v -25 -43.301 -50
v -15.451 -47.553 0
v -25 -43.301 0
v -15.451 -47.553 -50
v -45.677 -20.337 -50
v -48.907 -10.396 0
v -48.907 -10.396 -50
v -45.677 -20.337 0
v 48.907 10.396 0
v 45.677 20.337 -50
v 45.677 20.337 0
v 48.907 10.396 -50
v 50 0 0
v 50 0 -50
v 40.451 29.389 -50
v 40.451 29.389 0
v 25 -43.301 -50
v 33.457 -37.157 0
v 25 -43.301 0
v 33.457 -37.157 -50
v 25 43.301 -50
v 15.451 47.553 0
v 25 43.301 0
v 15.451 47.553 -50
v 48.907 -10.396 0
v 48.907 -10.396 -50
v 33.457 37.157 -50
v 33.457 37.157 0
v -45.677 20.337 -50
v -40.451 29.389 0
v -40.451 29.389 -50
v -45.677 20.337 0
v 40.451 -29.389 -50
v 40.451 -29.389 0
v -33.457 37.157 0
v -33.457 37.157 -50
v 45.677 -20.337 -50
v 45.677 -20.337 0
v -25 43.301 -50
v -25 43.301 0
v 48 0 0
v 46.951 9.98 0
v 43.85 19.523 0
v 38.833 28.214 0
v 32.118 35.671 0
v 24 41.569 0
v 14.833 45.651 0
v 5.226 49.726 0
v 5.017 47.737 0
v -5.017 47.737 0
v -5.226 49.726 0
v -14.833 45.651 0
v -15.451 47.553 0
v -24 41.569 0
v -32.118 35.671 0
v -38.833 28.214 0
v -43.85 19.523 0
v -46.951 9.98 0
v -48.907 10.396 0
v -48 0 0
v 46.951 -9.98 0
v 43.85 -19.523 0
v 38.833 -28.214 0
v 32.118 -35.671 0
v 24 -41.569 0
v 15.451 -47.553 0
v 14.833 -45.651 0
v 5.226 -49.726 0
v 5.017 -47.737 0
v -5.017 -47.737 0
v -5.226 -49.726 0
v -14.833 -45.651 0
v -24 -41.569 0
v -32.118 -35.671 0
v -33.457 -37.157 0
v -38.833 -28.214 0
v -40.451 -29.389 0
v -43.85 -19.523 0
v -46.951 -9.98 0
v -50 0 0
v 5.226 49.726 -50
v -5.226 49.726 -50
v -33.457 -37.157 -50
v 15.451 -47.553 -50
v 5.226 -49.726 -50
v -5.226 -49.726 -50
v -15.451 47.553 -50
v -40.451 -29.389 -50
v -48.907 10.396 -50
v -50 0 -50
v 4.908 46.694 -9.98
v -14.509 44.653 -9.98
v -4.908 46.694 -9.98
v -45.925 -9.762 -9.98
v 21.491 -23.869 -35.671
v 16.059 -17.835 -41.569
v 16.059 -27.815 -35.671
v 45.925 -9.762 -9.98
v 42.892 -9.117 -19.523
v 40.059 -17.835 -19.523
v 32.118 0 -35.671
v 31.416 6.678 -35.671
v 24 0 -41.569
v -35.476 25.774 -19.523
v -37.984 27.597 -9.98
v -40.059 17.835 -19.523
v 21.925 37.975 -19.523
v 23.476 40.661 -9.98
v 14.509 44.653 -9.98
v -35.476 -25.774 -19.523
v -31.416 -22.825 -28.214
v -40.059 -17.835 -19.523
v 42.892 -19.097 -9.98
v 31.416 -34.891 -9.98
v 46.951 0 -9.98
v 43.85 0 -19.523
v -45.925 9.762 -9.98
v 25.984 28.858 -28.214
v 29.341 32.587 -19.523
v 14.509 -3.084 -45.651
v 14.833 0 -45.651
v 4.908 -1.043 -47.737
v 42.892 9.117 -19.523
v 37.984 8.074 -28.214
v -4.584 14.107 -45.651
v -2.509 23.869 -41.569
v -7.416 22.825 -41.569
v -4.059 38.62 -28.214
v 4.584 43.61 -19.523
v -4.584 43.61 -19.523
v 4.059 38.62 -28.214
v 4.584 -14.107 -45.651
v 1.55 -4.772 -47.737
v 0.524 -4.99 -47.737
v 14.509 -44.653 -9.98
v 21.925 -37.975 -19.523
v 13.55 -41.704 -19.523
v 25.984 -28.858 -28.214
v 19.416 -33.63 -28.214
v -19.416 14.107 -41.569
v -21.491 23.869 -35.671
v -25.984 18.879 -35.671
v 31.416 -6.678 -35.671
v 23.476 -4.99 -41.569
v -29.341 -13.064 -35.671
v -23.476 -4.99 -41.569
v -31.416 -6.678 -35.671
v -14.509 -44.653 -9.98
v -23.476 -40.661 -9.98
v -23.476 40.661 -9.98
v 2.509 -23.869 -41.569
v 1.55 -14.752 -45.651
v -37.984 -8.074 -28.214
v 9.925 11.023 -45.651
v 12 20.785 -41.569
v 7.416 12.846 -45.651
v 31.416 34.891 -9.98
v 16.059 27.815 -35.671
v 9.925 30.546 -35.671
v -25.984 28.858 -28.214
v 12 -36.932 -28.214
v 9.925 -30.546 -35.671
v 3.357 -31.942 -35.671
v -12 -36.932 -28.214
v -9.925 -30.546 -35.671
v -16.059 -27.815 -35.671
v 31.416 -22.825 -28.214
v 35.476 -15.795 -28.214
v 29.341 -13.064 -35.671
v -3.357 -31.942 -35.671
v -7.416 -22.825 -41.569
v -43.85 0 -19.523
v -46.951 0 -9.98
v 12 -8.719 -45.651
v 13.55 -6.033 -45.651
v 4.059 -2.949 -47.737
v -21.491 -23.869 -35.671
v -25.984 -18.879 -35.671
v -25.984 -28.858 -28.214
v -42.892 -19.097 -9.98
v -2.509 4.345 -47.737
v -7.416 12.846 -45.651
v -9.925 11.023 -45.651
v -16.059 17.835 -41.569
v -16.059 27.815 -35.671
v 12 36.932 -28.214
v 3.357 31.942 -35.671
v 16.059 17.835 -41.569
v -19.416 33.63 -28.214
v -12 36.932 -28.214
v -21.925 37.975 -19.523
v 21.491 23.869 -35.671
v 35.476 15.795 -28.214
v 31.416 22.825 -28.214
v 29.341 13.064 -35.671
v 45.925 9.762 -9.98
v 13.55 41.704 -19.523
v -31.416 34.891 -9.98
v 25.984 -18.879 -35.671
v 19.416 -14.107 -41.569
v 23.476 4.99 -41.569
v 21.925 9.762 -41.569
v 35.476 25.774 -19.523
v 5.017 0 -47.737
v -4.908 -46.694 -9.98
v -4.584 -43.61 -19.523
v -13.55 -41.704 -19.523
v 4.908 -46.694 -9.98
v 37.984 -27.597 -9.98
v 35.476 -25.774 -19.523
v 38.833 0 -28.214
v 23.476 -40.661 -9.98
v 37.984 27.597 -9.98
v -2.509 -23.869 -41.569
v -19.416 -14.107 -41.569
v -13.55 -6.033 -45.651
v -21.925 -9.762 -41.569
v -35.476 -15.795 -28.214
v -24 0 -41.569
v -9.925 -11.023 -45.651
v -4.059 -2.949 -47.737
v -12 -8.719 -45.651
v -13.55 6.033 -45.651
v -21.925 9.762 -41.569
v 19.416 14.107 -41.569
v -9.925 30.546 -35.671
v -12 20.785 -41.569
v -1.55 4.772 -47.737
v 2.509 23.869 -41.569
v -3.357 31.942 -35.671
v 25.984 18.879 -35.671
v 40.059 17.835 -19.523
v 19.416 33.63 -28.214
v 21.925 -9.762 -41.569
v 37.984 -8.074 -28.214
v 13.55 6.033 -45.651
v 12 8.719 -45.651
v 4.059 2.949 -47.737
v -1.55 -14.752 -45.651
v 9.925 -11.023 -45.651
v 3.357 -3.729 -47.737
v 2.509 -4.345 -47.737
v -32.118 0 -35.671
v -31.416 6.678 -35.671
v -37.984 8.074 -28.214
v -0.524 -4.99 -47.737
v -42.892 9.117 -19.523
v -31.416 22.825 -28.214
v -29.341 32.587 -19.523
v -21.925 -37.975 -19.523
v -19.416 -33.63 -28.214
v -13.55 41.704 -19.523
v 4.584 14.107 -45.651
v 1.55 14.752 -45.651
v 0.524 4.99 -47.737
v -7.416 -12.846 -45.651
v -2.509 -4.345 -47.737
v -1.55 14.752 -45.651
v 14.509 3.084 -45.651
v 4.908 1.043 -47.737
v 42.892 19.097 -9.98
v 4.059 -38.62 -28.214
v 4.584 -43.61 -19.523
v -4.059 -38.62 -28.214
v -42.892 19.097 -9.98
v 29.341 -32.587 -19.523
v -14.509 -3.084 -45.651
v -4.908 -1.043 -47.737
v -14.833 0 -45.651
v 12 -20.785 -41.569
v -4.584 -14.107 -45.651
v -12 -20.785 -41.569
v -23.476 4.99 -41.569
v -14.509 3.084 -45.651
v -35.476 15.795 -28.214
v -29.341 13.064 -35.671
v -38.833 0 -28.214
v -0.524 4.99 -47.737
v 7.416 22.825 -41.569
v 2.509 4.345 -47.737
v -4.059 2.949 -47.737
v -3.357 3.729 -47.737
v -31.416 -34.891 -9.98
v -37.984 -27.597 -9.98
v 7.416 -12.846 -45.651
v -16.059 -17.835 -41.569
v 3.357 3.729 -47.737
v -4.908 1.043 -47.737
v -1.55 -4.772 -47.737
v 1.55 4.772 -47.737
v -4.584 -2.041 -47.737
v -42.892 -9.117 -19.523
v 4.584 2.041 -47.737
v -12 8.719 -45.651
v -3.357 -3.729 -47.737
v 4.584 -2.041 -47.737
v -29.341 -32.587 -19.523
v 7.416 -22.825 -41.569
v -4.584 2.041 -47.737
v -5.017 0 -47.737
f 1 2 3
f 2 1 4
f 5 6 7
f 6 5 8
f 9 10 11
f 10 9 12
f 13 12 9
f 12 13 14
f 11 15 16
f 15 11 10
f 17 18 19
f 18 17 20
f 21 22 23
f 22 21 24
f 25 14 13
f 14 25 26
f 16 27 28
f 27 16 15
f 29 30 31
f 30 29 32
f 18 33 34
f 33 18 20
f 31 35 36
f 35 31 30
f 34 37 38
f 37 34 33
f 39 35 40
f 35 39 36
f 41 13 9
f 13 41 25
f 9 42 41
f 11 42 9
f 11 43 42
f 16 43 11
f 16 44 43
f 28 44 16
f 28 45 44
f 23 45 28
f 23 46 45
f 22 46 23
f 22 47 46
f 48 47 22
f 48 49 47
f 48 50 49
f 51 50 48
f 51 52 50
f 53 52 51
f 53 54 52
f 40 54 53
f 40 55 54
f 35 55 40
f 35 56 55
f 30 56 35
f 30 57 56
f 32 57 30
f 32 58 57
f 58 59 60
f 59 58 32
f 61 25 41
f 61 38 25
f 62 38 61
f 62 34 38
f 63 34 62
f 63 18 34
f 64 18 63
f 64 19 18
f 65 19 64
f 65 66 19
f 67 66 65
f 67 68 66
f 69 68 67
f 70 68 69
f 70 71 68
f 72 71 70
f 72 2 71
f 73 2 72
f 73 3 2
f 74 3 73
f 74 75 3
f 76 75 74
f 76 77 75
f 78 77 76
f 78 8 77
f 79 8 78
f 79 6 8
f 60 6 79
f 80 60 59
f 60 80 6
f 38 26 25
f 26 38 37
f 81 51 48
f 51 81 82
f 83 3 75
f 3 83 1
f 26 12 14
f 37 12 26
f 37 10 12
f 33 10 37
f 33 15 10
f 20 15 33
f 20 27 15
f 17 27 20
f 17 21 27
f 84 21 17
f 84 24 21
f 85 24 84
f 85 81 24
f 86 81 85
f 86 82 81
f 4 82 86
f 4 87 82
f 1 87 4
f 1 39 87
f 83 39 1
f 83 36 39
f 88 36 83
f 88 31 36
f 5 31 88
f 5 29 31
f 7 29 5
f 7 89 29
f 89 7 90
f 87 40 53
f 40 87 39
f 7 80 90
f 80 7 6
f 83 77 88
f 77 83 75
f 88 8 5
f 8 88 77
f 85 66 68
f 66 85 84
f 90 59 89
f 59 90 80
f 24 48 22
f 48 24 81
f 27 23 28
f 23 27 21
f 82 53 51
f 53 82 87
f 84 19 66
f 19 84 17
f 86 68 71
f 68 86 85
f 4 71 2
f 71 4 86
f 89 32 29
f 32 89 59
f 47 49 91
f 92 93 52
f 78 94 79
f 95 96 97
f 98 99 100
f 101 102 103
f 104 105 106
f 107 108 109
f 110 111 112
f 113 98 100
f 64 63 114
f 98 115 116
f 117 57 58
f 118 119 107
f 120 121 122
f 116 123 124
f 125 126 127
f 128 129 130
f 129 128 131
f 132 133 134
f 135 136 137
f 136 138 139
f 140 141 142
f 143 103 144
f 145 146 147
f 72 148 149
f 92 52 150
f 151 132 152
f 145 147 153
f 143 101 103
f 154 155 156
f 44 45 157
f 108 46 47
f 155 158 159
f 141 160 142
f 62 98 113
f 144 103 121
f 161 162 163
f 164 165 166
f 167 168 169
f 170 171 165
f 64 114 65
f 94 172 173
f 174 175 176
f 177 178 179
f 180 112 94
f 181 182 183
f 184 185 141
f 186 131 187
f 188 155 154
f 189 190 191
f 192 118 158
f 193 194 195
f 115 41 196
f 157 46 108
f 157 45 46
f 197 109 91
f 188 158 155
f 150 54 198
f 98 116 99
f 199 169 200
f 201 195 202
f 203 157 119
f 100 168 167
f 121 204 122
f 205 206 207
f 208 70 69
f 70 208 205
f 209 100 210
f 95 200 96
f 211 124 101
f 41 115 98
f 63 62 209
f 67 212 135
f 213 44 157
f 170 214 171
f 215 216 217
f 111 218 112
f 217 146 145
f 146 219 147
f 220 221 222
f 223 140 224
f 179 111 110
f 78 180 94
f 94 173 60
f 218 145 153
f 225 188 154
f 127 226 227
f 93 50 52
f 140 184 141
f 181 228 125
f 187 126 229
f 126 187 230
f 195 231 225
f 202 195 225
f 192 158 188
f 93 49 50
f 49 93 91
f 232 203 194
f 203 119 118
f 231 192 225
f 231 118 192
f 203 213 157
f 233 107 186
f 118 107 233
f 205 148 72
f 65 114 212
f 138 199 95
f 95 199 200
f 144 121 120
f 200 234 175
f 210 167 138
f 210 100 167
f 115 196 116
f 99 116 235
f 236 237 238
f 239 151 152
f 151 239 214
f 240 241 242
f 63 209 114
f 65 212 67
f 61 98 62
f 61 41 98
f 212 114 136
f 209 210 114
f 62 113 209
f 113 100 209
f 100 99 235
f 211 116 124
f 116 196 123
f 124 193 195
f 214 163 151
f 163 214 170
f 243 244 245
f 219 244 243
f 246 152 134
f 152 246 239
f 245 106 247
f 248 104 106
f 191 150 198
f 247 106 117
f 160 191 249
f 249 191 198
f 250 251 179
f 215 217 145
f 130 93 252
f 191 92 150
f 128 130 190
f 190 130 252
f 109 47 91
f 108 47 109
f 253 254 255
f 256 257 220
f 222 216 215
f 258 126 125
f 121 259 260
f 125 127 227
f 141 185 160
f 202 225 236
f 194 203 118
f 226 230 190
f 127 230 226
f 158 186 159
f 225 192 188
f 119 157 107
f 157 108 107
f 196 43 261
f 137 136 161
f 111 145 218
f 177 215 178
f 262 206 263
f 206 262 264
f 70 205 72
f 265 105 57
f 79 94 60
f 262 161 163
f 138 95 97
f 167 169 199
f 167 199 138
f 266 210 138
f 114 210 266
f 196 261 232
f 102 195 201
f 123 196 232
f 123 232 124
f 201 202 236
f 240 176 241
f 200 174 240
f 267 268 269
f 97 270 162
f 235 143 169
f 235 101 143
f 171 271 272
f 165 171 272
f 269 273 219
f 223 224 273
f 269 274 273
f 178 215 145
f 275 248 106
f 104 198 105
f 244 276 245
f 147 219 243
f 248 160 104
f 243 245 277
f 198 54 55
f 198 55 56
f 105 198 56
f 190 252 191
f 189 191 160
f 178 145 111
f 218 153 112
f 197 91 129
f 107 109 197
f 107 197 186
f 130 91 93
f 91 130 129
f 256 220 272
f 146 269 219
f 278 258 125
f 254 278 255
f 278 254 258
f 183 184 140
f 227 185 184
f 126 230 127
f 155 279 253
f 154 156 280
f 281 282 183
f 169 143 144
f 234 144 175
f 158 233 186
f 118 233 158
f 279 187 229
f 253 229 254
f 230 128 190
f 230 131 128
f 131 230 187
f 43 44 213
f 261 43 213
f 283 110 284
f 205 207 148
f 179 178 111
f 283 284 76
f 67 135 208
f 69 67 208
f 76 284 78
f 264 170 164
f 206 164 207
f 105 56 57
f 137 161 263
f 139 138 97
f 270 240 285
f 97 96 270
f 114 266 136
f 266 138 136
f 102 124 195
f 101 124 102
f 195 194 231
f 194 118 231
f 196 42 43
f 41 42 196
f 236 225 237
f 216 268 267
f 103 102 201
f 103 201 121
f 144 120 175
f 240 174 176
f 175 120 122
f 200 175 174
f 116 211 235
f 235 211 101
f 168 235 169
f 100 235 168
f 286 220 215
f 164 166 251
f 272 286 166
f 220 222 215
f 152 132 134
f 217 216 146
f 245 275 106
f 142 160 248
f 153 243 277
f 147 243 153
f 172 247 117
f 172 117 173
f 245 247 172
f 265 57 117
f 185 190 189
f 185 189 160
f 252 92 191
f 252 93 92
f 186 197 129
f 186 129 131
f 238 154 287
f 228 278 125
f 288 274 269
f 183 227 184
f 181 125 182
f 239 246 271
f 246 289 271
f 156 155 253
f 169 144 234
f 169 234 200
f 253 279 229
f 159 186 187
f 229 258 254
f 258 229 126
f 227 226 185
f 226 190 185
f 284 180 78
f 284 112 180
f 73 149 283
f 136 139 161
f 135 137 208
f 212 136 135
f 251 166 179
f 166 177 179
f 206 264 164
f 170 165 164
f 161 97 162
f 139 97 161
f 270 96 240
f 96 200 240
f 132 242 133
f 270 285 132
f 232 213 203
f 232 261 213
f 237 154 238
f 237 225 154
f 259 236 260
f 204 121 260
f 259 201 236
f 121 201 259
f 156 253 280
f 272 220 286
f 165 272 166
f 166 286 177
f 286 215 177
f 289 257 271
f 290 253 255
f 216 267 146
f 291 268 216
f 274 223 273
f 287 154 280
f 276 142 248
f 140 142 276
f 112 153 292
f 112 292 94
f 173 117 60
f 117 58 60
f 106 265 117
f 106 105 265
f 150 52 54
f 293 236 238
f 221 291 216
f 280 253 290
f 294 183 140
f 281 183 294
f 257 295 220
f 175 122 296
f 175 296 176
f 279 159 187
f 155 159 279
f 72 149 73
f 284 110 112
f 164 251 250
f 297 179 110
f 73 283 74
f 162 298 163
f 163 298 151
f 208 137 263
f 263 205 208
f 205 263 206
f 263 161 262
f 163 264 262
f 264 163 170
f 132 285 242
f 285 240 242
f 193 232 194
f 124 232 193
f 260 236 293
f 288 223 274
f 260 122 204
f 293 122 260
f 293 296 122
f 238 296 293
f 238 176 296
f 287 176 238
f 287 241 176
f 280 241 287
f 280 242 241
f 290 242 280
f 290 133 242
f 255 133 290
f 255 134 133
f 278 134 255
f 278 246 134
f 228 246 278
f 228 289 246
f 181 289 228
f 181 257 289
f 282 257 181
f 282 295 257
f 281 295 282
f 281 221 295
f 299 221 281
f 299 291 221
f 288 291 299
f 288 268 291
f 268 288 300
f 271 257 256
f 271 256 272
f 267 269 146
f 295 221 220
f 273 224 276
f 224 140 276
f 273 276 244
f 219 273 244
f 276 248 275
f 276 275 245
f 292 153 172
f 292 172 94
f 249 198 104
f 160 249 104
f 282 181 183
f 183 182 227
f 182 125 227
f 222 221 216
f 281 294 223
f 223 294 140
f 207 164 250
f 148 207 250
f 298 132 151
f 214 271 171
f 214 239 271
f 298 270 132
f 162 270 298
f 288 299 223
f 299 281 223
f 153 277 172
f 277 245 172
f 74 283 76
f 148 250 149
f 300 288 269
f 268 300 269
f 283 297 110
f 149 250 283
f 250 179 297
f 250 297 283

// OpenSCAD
/* A useful adjustable bowl script for arbitrary sized bowls.
Could probably use some optimization. */

rim=100;
thickness=2;

difference(){
translate([0,0,-rim/2])cylinder(rim/2,rim/2,rim/2);
sphere((rim/2)-thickness);
}
